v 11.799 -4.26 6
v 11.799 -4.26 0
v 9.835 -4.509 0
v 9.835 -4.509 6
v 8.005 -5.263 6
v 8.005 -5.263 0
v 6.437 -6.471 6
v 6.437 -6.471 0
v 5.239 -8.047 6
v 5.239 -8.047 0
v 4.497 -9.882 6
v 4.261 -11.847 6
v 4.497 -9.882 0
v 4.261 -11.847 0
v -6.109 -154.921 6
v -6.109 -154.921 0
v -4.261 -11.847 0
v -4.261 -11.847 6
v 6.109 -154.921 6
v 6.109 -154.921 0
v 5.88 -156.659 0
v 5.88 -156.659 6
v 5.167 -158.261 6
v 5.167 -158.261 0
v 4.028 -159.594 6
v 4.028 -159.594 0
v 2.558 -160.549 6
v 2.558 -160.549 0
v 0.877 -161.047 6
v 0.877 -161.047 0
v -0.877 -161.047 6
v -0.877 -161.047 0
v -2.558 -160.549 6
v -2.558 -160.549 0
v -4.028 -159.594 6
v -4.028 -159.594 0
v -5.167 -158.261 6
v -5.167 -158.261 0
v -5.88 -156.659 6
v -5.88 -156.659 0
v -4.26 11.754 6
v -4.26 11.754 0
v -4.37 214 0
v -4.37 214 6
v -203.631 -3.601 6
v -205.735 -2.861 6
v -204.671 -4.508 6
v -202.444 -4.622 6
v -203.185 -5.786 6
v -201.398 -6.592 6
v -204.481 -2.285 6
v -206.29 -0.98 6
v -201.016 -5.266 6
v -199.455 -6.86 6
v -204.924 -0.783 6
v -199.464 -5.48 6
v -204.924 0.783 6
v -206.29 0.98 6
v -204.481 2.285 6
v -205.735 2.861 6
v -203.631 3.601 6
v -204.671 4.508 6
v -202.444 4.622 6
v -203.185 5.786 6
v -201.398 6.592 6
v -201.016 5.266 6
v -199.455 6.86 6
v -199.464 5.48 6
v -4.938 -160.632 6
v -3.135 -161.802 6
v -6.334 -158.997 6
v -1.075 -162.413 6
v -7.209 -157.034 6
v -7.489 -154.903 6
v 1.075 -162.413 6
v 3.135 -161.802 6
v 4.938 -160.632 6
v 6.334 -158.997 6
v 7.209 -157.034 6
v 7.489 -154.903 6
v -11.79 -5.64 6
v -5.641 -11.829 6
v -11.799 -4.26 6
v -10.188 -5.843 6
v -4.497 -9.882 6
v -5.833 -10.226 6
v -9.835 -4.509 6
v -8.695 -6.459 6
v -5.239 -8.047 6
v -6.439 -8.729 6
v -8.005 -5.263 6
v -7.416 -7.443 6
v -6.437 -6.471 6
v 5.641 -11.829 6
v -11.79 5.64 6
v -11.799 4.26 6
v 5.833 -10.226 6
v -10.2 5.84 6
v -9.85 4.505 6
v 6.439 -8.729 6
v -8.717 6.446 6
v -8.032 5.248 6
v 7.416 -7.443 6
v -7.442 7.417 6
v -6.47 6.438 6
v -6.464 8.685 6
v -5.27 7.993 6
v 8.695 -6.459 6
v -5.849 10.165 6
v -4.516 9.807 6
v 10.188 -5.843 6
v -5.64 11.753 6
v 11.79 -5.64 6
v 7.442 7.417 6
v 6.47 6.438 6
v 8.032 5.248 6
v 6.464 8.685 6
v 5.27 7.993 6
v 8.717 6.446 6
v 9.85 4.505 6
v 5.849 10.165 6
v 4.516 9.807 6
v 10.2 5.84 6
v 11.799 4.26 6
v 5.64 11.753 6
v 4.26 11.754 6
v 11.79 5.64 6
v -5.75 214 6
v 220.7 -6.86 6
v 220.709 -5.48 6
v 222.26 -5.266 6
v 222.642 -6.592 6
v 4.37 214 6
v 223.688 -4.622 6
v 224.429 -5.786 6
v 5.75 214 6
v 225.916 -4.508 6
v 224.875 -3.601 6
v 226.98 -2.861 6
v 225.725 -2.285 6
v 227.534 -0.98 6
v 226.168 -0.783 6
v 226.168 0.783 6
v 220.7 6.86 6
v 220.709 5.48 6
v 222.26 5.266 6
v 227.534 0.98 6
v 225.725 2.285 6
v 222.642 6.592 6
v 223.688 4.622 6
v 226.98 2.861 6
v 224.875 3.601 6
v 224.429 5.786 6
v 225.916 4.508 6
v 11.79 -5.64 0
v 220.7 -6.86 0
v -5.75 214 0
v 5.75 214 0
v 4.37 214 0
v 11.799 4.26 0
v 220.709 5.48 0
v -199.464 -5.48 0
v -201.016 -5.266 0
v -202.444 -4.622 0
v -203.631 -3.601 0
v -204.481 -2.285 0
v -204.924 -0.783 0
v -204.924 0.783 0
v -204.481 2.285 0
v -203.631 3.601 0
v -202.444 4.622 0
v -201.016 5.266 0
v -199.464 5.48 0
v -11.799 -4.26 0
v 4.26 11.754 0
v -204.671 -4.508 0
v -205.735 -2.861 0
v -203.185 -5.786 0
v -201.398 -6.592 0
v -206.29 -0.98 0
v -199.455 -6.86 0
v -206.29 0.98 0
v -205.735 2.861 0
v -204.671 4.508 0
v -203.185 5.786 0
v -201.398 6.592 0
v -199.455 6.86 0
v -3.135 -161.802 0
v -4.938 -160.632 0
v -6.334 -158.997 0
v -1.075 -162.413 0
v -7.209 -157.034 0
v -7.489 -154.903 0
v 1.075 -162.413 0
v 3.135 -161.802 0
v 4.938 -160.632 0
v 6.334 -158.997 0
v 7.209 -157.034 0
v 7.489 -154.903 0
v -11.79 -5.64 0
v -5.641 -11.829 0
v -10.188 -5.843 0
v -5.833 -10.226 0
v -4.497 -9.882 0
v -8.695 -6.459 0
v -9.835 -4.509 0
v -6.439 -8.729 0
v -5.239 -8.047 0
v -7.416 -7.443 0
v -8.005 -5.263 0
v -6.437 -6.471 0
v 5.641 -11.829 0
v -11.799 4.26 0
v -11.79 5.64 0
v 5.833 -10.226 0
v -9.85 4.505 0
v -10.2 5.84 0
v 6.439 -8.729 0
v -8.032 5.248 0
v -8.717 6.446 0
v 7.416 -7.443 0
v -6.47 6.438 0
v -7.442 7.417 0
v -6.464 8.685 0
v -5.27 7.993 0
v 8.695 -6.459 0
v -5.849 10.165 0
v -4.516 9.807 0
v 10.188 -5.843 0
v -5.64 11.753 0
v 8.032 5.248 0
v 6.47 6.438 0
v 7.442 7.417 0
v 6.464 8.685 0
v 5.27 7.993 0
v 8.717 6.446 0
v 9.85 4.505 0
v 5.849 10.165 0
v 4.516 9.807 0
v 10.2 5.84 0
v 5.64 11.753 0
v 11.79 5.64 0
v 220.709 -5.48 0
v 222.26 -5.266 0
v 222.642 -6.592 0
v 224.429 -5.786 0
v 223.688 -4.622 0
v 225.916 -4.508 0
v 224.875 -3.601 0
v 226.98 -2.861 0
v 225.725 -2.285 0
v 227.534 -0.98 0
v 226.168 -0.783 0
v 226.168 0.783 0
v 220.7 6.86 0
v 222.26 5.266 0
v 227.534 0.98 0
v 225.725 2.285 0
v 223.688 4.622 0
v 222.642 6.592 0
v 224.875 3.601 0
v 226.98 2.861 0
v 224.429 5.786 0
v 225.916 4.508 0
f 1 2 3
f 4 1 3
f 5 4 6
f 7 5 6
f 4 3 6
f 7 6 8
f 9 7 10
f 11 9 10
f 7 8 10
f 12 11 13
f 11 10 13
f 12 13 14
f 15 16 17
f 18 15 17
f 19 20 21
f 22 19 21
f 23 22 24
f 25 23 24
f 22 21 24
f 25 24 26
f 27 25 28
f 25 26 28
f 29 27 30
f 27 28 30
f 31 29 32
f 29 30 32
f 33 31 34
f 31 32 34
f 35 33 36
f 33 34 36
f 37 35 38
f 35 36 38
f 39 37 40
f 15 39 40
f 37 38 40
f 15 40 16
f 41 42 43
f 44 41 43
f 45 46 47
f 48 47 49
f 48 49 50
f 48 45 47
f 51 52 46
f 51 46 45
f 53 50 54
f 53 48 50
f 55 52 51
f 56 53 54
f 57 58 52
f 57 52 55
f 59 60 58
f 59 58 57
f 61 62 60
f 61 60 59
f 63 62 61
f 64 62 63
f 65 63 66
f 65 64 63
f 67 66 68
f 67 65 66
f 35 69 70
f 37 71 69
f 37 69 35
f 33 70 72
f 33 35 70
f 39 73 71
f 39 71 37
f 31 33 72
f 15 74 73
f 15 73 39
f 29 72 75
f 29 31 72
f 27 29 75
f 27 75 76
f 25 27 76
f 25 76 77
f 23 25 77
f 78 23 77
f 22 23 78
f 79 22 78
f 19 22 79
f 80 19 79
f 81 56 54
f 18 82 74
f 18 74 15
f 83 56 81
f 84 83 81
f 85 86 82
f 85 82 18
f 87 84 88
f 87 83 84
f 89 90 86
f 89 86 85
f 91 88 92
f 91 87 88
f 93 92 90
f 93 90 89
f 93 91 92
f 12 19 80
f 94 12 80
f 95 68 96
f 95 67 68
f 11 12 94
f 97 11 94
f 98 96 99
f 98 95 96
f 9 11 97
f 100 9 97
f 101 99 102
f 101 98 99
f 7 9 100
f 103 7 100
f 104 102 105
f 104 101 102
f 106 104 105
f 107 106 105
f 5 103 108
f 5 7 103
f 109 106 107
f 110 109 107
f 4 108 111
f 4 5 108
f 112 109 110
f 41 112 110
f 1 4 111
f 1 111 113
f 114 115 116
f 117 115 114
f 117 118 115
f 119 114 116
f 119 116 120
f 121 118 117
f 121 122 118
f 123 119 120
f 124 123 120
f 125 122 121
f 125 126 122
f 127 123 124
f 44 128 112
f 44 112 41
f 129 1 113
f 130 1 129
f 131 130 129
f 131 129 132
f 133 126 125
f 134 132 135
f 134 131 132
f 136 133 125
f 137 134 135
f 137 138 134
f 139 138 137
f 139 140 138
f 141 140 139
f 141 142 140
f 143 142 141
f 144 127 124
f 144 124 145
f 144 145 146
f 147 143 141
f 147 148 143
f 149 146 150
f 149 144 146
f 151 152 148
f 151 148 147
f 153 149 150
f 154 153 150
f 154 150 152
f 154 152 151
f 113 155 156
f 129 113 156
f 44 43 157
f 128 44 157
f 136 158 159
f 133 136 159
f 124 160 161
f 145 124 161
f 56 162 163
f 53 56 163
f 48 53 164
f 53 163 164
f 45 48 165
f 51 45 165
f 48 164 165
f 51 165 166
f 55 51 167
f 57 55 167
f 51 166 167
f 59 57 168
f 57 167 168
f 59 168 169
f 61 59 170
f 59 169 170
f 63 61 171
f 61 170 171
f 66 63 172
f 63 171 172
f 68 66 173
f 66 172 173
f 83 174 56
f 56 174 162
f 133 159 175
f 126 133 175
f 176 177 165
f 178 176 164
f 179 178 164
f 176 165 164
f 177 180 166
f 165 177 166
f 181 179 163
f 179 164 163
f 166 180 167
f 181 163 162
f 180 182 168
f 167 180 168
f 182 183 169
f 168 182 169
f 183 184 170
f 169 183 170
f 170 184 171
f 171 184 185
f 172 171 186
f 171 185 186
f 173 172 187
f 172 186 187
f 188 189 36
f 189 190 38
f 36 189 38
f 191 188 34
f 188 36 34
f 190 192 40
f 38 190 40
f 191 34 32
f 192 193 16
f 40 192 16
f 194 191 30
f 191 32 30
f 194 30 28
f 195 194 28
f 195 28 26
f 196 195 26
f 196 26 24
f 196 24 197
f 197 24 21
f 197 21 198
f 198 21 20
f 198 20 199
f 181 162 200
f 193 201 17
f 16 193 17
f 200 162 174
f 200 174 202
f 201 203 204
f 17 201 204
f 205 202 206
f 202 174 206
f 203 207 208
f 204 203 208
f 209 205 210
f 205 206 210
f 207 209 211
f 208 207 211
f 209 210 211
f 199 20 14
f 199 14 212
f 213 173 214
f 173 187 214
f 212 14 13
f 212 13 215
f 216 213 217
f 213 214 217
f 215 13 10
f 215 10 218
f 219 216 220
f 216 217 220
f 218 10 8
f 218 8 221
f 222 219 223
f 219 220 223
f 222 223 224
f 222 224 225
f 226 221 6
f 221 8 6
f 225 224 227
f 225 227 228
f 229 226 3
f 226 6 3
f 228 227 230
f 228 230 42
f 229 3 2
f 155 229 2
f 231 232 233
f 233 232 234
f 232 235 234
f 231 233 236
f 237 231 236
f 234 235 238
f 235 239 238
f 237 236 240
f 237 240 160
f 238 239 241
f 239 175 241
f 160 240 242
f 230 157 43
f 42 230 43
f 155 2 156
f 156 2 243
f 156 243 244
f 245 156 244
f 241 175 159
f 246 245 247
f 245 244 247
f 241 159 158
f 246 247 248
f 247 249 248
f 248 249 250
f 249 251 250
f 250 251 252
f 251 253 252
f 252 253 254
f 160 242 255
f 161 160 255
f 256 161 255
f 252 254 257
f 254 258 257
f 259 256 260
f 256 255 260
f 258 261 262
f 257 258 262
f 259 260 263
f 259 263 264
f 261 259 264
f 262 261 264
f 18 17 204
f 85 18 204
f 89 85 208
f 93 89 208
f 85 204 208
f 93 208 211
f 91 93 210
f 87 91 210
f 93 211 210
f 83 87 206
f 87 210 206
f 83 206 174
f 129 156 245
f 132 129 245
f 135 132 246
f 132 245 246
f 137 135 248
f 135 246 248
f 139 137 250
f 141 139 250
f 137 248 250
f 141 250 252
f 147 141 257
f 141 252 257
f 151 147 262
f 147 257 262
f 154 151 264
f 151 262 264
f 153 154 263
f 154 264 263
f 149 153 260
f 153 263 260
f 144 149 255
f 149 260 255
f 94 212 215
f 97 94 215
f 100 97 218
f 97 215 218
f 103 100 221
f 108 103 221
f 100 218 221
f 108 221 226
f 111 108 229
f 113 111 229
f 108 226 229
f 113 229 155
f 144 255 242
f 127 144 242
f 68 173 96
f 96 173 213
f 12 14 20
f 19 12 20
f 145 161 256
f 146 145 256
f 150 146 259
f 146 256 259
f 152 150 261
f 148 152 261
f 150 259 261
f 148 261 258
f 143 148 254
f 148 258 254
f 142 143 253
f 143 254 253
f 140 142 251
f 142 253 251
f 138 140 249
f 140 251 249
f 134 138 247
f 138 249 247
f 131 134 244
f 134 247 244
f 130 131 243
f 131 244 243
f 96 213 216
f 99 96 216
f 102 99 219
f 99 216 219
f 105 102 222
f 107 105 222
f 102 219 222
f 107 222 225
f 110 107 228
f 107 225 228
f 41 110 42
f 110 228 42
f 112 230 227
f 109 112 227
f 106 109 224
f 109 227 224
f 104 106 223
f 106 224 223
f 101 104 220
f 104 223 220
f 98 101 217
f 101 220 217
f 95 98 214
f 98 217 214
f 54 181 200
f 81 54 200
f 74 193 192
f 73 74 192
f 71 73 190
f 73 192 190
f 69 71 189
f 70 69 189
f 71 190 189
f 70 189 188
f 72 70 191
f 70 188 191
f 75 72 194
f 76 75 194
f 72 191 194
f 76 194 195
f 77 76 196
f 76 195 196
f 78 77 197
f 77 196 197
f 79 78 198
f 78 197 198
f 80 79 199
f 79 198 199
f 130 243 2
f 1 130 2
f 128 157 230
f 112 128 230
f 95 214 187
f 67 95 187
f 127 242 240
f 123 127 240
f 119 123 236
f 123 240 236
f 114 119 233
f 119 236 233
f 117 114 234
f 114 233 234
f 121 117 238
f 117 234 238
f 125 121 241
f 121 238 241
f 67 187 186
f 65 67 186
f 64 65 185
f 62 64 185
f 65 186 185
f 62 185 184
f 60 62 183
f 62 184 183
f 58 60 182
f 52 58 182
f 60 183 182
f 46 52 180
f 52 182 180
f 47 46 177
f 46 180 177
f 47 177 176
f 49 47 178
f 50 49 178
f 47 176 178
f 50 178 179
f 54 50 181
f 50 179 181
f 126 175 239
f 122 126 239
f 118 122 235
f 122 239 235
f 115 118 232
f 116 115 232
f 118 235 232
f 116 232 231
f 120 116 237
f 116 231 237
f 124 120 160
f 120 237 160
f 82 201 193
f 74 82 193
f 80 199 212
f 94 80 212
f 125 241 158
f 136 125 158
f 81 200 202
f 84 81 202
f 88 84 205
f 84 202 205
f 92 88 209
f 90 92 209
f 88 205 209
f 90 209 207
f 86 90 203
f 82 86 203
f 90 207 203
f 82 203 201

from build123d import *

# Parameters (mm, degrees)
F1_DEPTH = 6


with BuildPart() as f1:
    # F0 (on Top) → F1 (new body)
    with BuildSketch(Plane.XY):
        with BuildLine():
            ThreePointArc((-5.640001, 11.753323), (-7.442462, 7.416732), (-11.789711, 5.640129))
            Line((-11.789711, 5.640129), (-199.455415, 6.859855))
            ThreePointArc((-199.455415, 6.859855), (-206.36, 0), (-199.455415, -6.859855))
            Line((-199.455415, -6.859855), (-11.789711, -5.640129))
            ThreePointArc((-11.789711, -5.640129), (-7.415726, -7.443473), (-5.64051, -11.828949))
            Line((-5.64051, -11.828949), (-7.489375, -154.903219))
            ThreePointArc((-7.489375, -154.903219), (0, -162.49), (7.489375, -154.903219))
            Line((7.489375, -154.903219), (5.64051, -11.828949))
            ThreePointArc((5.64051, -11.828949), (7.415726, -7.443473), (11.789711, -5.640129))
            Line((11.789711, -5.640129), (220.7, -6.859855))
            ThreePointArc((220.7, -6.859855), (227.604585, 0), (220.7, 6.859855))
            Line((220.7, 6.859855), (11.789711, 5.640129))
            ThreePointArc((11.789711, 5.640129), (7.442462, 7.416732), (5.640001, 11.753323))
            Line((5.640001, 11.753323), (5.75, 214))
            Line((5.75, 214), (4.37, 214))
            Line((4.37, 214), (4.260001, 11.754074))
            ThreePointArc((4.260001, 11.754074), (6.469564, 6.438023), (11.79868, 4.260158))
            Line((11.79868, 4.260158), (220.708969, 5.479884))
            ThreePointArc((220.708969, 5.479884), (226.224585, 0), (220.708969, -5.479884))
            Line((220.708969, -5.479884), (11.79868, -4.260158))
            ThreePointArc((11.79868, -4.260158), (6.43679, -6.470805), (4.260625, -11.846781))
            Line((4.260625, -11.846781), (6.10949, -154.921051))
            ThreePointArc((6.10949, -154.921051), (0, -161.11), (-6.10949, -154.921051))
            Line((-6.10949, -154.921051), (-4.260625, -11.846781))
            ThreePointArc((-4.260625, -11.846781), (-6.43679, -6.470805), (-11.79868, -4.260158))
            Line((-11.79868, -4.260158), (-199.464384, -5.479884))
            ThreePointArc((-199.464384, -5.479884), (-204.98, 0), (-199.464384, 5.479884))
            Line((-199.464384, 5.479884), (-11.79868, 4.260158))
            ThreePointArc((-11.79868, 4.260158), (-6.469564, 6.438023), (-4.260001, 11.754074))
            Line((-4.260001, 11.754074), (-4.37, 214))
            Line((-4.37, 214), (-5.75, 214))
            Line((-5.75, 214), (-5.640001, 11.753323))
        make_face()
    extrude(amount=F1_DEPTH)


solid = f1.part
